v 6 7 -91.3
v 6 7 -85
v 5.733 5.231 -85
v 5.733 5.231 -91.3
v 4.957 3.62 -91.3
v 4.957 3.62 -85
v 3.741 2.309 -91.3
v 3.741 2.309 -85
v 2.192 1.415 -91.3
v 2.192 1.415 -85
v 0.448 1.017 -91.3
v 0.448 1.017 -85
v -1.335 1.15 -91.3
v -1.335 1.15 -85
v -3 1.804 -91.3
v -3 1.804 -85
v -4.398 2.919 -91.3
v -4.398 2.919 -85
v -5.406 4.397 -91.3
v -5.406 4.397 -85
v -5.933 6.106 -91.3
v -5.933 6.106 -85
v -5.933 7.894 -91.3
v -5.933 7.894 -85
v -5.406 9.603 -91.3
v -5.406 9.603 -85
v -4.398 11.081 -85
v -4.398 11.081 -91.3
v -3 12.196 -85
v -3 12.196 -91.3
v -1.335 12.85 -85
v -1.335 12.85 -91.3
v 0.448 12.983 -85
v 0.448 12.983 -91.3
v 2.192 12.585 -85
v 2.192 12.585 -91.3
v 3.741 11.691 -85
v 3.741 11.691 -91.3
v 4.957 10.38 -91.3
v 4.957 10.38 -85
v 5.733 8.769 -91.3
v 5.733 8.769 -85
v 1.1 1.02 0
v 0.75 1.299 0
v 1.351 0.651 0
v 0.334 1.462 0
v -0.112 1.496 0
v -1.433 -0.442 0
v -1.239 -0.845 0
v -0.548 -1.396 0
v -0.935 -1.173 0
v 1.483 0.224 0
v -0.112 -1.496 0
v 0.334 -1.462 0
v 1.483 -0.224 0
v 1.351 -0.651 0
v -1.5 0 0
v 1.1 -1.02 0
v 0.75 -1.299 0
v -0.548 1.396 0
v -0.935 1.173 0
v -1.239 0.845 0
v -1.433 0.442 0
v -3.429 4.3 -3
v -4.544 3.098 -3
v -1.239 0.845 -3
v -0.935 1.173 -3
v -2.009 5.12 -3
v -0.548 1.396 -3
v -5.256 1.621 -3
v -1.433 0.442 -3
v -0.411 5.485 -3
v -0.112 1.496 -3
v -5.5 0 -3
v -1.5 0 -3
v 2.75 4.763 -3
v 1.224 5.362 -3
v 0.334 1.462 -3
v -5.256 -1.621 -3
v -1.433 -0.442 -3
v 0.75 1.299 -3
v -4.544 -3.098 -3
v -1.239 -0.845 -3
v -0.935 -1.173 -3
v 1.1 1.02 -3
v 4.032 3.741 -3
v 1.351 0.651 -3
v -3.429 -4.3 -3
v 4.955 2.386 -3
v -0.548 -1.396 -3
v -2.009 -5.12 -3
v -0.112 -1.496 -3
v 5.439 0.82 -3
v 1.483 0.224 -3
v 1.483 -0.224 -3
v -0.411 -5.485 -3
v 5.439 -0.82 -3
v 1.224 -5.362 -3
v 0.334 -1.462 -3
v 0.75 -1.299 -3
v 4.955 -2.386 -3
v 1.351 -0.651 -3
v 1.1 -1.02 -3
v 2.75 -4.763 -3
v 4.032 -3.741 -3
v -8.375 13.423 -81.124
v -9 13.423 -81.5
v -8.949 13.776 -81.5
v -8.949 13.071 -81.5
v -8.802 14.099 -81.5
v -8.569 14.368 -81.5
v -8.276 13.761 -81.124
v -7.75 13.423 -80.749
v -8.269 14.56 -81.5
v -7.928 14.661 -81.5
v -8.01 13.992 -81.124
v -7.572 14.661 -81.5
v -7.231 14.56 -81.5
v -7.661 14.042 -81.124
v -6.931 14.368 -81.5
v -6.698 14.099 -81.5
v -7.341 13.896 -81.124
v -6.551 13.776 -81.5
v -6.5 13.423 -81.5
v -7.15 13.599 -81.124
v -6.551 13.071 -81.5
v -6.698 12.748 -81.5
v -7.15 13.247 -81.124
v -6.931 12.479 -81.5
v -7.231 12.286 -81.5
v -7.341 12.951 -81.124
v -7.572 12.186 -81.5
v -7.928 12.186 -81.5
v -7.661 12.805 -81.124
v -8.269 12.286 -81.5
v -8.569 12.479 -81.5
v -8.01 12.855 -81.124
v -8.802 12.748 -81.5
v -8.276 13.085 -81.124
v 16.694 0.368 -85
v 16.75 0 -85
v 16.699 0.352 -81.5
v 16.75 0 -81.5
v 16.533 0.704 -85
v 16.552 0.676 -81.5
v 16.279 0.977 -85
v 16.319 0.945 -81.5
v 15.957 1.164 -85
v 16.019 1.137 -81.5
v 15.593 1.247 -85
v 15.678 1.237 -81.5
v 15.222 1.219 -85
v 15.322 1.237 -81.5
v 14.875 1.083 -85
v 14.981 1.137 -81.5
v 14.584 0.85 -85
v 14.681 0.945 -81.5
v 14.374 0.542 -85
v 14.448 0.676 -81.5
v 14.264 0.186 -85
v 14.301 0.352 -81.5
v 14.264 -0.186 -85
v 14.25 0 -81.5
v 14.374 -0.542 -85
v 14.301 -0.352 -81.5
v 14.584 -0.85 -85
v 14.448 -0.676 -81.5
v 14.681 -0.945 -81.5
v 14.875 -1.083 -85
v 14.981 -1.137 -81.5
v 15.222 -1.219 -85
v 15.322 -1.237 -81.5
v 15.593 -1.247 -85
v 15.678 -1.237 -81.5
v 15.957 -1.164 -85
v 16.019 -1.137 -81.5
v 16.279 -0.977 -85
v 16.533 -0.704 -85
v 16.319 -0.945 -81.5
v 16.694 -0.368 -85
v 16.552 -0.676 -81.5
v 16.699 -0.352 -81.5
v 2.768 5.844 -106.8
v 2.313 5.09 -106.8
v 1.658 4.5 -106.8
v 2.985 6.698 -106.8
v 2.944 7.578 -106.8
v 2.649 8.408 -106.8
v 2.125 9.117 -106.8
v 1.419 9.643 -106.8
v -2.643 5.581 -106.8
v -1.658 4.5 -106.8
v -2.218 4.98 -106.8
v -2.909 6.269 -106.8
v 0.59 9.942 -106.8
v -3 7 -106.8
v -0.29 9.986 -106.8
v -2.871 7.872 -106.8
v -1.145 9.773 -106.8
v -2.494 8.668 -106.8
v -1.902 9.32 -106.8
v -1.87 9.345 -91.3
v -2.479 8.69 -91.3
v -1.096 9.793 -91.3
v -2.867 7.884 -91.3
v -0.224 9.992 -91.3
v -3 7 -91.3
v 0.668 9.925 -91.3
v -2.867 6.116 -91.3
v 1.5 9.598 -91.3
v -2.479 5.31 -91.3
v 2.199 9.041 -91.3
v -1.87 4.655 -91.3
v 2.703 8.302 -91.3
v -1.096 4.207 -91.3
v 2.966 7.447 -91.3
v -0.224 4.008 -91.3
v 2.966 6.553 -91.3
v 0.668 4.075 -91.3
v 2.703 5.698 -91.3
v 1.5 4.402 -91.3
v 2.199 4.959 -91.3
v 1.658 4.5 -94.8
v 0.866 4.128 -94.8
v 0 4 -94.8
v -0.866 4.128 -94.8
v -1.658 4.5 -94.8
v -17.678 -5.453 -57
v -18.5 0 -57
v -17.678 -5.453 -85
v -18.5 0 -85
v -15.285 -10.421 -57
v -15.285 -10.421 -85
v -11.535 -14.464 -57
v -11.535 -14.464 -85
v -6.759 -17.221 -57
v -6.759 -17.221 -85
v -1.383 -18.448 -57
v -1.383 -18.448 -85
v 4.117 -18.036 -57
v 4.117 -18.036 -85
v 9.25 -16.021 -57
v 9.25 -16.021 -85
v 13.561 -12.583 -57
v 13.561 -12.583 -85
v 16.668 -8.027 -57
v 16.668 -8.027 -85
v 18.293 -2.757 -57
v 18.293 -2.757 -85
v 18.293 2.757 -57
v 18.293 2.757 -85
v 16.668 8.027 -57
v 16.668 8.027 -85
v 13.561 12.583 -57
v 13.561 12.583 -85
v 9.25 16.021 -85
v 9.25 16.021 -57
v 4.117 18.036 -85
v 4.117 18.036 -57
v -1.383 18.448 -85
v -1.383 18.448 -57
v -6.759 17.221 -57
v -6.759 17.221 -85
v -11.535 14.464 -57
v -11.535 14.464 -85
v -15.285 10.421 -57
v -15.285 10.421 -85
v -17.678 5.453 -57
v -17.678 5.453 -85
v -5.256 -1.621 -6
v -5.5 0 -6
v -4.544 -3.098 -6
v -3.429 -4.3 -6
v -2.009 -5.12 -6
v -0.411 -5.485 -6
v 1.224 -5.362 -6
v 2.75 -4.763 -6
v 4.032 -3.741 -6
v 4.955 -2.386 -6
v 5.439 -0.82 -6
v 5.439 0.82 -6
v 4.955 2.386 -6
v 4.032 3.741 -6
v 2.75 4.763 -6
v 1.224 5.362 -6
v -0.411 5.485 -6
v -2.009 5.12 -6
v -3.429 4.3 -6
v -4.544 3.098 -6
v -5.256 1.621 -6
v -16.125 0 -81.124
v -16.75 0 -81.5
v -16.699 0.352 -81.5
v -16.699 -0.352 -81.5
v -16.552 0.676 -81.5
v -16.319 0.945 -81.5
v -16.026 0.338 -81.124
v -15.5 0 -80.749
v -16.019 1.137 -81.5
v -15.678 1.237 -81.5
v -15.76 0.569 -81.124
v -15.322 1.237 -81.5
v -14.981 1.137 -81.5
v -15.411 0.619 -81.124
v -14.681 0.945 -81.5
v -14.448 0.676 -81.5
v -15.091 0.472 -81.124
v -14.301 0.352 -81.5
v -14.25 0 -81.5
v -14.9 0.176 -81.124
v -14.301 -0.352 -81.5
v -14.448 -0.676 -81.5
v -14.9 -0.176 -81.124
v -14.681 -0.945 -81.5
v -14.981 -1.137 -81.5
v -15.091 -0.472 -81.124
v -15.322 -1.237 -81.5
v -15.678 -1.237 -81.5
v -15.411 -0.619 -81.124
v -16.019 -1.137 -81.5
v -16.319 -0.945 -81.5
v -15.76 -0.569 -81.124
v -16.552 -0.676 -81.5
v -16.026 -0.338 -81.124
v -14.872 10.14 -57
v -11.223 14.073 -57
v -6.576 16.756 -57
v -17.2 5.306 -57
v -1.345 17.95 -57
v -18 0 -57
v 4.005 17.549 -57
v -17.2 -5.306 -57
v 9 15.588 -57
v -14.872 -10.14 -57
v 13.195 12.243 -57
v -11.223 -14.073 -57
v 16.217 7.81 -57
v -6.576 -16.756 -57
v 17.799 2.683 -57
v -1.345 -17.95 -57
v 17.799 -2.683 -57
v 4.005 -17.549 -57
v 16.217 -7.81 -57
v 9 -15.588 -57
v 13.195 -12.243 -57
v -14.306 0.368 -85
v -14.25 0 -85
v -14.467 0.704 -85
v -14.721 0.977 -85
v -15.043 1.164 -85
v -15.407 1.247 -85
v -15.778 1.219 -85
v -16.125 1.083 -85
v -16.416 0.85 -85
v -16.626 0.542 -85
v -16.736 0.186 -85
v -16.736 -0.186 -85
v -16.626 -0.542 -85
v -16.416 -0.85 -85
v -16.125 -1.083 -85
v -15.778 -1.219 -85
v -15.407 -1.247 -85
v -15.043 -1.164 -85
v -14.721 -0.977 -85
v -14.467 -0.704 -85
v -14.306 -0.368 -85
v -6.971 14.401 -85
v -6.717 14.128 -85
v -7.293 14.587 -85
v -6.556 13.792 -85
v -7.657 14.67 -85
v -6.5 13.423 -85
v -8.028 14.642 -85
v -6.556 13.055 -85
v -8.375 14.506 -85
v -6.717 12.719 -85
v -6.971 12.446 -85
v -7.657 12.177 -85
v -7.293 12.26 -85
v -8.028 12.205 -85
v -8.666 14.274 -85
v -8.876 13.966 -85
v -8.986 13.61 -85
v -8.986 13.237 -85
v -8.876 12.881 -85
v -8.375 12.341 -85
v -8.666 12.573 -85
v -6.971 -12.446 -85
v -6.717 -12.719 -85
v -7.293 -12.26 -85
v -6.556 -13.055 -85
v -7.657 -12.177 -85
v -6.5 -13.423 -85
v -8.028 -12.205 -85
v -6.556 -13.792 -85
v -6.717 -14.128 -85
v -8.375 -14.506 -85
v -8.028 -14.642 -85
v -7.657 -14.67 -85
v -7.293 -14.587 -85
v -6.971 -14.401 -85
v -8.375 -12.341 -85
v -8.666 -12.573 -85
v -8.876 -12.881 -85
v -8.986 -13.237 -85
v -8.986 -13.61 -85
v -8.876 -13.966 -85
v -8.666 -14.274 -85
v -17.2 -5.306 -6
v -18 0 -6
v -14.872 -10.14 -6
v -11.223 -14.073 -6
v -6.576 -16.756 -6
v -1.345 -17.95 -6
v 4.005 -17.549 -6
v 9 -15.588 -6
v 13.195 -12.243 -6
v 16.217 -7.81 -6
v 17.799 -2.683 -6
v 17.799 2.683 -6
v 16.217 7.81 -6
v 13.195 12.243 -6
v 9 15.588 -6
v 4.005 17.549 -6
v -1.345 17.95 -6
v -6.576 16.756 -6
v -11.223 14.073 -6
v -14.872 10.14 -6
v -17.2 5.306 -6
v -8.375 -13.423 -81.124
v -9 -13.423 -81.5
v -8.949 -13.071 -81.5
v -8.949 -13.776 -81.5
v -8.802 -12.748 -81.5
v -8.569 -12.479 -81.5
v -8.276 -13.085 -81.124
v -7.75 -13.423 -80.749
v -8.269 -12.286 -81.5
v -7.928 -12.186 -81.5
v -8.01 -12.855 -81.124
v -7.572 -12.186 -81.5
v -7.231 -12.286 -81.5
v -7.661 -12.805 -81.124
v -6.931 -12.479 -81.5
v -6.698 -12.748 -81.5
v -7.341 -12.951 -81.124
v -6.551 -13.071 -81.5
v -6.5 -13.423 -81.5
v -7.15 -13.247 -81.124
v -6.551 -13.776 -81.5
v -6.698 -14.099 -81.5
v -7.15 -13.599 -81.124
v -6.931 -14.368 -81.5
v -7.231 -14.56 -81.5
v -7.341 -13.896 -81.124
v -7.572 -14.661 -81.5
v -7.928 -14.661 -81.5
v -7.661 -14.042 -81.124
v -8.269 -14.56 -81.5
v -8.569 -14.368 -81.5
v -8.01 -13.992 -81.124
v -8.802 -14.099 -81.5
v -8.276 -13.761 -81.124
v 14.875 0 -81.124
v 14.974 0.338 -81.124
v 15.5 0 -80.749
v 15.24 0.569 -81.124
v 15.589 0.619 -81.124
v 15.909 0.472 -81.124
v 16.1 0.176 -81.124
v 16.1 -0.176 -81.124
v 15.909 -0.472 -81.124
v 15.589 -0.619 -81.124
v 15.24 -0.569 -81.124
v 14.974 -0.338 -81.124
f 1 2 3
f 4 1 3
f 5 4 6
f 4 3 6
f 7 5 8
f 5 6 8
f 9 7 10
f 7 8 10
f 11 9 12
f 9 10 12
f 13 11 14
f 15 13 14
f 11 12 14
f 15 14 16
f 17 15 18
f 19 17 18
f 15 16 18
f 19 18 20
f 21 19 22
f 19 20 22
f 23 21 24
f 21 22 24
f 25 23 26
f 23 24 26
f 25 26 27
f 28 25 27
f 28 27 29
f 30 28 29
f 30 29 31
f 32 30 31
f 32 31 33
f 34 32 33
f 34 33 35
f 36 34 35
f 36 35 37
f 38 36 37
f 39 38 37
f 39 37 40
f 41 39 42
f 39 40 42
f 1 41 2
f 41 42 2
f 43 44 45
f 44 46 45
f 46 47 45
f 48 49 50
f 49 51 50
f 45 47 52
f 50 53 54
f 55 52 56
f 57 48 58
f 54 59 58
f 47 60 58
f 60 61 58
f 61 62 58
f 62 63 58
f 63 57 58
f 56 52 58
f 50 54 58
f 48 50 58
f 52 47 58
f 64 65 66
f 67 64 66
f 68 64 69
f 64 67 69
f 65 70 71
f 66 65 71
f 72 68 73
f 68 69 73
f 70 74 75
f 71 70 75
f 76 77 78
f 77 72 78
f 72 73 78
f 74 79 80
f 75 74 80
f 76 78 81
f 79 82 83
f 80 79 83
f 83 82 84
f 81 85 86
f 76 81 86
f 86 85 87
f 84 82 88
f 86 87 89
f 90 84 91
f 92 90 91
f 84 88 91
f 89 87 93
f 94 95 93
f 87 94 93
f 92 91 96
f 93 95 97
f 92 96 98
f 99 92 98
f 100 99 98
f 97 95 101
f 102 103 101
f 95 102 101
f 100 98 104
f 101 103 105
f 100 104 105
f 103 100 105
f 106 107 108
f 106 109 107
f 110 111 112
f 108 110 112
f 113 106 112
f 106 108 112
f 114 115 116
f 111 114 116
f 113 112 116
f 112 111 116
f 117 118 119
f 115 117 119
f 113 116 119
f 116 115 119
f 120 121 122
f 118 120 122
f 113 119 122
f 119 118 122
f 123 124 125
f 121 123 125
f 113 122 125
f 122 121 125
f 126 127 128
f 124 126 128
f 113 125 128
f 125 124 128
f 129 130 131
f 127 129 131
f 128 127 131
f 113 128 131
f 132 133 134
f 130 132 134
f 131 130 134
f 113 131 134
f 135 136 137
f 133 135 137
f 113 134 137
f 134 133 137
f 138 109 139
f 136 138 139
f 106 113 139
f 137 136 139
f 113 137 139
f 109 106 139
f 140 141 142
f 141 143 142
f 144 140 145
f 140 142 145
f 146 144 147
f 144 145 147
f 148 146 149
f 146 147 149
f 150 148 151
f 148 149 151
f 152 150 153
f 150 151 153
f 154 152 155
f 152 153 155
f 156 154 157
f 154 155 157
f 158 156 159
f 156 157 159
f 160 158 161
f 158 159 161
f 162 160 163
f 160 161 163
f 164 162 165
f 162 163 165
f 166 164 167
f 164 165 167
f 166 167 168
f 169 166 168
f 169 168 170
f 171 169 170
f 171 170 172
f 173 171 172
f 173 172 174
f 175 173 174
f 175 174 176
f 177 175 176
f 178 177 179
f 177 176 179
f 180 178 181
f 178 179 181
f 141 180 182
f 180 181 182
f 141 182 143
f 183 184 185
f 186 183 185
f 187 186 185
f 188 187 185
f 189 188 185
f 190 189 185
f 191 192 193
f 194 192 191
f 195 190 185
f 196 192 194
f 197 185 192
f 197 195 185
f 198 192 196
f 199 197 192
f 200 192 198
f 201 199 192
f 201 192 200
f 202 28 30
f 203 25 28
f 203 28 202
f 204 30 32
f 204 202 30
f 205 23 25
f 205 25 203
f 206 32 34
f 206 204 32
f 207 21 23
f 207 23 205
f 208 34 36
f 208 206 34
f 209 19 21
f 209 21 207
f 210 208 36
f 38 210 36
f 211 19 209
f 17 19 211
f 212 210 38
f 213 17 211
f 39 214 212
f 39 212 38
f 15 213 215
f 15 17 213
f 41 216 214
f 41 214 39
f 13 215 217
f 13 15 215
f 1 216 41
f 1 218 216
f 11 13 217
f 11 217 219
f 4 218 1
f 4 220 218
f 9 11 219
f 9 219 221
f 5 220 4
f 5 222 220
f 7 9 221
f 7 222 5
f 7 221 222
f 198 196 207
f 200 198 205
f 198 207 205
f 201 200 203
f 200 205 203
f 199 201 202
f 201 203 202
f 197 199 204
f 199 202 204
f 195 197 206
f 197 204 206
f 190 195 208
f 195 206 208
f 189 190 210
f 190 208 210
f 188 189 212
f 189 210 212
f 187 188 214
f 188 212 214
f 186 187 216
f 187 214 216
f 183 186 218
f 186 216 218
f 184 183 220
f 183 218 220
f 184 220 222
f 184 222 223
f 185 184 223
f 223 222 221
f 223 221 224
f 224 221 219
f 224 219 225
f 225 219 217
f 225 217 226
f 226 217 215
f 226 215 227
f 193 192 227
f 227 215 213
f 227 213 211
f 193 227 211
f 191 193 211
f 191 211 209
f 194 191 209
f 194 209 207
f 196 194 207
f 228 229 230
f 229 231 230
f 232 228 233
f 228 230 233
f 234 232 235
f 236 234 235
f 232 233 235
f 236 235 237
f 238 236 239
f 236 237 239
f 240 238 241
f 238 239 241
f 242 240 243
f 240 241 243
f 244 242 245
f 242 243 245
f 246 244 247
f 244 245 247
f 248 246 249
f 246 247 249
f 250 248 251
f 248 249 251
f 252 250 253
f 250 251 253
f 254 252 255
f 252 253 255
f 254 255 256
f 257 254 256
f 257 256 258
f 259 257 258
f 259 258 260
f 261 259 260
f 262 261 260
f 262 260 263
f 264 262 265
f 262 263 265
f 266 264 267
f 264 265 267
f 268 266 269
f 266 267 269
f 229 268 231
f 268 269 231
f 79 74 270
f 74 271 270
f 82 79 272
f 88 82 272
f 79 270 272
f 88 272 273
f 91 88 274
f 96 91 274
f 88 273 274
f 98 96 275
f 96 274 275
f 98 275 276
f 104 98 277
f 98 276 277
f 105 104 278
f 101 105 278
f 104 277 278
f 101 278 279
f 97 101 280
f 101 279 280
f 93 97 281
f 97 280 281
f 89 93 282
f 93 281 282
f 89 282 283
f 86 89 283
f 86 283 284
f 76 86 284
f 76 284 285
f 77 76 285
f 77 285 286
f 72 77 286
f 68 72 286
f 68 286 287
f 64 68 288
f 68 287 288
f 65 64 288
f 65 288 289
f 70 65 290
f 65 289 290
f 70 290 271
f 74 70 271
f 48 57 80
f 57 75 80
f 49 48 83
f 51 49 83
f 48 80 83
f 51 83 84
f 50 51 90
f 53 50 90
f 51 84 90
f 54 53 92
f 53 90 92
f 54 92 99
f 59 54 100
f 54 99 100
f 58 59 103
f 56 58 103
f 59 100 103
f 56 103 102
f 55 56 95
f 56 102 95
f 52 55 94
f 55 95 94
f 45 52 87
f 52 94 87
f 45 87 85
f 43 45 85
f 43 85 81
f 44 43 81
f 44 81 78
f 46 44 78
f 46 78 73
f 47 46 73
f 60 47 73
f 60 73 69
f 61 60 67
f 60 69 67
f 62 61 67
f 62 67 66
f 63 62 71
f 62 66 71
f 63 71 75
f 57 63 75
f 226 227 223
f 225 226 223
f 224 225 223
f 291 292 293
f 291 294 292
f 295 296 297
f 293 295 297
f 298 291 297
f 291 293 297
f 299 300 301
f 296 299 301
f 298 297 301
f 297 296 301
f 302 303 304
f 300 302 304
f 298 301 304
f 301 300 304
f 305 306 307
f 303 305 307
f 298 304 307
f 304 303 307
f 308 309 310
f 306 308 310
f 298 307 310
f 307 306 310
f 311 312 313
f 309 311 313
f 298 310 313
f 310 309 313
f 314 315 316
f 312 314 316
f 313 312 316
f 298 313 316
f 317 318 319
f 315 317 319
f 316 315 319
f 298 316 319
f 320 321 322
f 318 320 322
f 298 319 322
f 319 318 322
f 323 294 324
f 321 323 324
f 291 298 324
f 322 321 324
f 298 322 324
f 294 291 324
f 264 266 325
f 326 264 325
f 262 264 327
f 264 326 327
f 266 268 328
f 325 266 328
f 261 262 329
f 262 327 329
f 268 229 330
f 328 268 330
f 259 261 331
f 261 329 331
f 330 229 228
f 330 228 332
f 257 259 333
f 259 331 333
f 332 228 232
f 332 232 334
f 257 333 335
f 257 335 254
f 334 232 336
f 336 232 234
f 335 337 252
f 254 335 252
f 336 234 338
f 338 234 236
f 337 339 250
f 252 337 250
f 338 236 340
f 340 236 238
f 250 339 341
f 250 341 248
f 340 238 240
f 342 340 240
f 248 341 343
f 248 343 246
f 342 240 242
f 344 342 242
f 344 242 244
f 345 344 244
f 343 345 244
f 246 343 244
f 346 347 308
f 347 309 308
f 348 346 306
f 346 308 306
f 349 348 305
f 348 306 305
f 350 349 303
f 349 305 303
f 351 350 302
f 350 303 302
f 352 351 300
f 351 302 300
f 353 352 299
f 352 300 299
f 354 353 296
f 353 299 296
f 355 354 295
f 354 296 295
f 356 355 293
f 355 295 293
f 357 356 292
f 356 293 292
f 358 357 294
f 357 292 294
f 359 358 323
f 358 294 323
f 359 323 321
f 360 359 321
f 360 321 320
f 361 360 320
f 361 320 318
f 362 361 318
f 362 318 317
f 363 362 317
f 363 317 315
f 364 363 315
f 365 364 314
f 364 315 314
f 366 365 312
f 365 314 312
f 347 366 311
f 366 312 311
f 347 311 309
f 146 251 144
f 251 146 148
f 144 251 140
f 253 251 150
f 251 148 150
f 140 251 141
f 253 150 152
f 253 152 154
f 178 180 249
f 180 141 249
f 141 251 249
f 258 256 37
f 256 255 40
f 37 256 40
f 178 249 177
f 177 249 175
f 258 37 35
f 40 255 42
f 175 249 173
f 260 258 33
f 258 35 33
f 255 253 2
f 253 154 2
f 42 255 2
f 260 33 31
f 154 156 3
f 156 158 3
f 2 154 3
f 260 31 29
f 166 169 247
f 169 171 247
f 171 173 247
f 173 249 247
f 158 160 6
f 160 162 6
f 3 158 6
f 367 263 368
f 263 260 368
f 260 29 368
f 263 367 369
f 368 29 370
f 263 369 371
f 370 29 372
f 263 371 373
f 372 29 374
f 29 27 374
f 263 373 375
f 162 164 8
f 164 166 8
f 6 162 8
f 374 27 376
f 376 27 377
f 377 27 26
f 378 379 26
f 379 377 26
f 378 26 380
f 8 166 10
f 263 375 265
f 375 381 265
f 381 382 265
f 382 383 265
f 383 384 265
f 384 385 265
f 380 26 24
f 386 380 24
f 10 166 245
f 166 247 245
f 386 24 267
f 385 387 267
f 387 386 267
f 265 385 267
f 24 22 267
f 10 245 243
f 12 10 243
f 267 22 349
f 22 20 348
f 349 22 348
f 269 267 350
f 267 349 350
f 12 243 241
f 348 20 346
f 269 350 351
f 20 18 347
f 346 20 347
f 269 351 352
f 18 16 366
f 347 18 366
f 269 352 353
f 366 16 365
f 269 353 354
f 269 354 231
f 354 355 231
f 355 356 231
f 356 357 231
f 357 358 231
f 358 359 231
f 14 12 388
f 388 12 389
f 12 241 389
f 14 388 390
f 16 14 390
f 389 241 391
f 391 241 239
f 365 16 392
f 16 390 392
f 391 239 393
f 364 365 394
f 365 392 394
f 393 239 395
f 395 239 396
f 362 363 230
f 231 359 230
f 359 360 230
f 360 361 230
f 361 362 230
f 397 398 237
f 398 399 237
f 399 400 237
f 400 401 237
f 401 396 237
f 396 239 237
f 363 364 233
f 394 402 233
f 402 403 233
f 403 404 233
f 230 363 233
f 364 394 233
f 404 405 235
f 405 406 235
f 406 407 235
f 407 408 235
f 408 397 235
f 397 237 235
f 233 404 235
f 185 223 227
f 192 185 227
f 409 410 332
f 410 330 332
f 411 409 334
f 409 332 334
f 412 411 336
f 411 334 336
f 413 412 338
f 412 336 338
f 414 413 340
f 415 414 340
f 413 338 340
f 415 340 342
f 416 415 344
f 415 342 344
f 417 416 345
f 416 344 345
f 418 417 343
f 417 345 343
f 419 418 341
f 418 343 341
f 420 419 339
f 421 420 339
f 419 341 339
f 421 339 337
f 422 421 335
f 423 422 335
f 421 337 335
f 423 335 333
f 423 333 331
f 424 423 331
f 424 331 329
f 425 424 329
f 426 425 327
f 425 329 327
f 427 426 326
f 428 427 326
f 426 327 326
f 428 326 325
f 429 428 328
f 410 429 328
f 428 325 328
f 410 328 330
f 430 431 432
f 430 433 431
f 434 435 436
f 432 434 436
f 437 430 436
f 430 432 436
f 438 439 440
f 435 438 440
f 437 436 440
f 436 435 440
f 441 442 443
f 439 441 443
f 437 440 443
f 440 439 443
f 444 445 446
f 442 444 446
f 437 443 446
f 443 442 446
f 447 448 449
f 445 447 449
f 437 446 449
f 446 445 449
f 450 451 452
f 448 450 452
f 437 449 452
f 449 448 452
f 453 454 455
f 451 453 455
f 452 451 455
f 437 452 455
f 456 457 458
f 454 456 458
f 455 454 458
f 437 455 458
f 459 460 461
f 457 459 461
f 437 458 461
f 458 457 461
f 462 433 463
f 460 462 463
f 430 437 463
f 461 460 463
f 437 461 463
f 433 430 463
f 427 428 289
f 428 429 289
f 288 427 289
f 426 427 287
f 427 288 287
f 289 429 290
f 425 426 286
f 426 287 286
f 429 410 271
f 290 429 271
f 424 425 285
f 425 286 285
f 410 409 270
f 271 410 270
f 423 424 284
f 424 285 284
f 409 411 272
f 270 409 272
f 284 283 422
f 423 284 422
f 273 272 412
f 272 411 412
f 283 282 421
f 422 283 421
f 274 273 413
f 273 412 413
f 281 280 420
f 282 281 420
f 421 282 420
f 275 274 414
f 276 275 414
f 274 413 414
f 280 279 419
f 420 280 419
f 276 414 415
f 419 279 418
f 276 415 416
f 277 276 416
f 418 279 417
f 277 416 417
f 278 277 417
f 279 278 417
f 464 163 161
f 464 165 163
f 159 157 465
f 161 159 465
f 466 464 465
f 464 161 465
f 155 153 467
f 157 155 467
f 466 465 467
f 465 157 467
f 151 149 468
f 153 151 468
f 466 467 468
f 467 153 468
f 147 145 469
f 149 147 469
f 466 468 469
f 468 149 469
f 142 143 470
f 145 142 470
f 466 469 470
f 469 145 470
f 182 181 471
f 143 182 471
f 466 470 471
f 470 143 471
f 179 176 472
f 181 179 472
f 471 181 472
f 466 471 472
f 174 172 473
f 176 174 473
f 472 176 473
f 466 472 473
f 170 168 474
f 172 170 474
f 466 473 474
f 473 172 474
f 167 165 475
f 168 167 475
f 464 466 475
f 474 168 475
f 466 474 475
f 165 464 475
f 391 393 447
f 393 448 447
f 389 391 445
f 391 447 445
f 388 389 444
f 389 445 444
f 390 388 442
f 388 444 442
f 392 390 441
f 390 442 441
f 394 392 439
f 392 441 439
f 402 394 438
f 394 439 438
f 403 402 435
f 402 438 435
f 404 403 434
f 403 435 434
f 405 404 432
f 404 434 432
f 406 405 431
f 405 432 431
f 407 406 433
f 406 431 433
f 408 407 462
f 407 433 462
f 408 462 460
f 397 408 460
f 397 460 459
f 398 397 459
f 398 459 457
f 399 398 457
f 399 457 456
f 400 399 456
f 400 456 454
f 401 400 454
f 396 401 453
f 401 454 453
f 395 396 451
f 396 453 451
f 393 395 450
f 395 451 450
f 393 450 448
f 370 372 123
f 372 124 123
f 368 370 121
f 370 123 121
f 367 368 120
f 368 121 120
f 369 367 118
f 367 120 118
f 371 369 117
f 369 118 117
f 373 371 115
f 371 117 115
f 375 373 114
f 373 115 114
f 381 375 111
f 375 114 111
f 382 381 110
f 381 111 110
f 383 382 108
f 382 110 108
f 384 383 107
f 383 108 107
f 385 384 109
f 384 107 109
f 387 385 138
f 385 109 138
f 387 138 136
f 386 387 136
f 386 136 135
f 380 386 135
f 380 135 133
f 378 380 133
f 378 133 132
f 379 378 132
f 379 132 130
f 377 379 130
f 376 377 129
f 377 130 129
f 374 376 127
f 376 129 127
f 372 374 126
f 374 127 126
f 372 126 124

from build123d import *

# Parameters (mm, degrees)
SKETCH2_R                 = 6
BOSS_EXTRUDE1_DEPTH       = 6.3
SKETCH3_R                 = 3
BOSS_EXTRUDE2_DEPTH       = 15.5
M3X0_5_TAPPED_HOLE1_D     = 2.5
M3X0_5_TAPPED_HOLE1_DEPTH = 3.5
M3X0_5_TAPPED_HOLE1_TIP   = 0.751075774
CUT_EXTRUDE1_START        = -12
CUT_EXTRUDE1_DEPTH        = 12


with BuildPart() as part:
    # Sketch1 → Revolve1 (revolve)
    with BuildSketch(Plane(origin=(0, 0, 0), x_dir=(0, 0, -1), z_dir=(1, 0, 0)), mode=Mode.PRIVATE) as revolve1_sk:
        Polygon((0, 0), (0, -1.5), (3, -1.5), (3, -5.5), (6, -5.5), (6, -18), (57, -18), (57, -18.5), (85, -18.5), (85, 0), align=None)
    revolve(revolve1_sk.sketch.rotate(Axis((0, 0, -33.870967742), (0, 0, 1)), 270), axis=Axis((0, 0, -33.870967742), (0, 0, 1)))

    # Sketch2 → Boss-Extrude1 (add)
    with BuildSketch(Plane(origin=(0, 0, -85), x_dir=(-1, 0, 0), z_dir=(0, 0, -1))):
        with Locations(Location((0, 7, 0), (0, 0, 180))):
            Circle(SKETCH2_R)
    extrude(amount=BOSS_EXTRUDE1_DEPTH)

    # Sketch3 → Boss-Extrude2 (add)
    with BuildSketch(Plane(origin=(0, 0, -91.3), x_dir=(-1, 0, 0), z_dir=(0, 0, -1))):
        with Locations((0, 7)):
            Circle(SKETCH3_R)
    extrude(amount=BOSS_EXTRUDE2_DEPTH)

    # M3x0.5 Tapped Hole1
    with Locations(Plane(origin=(0, 0, -85), x_dir=(-1, 0, 0), z_dir=(0, 0, -1))):
        with Locations((7.75, -13.423393759), (15.5, 0), (-15.5, 0), (7.75, 13.423393759)):
            Hole(M3X0_5_TAPPED_HOLE1_D / 2, depth=M3X0_5_TAPPED_HOLE1_DEPTH)
            with Locations((0, 0, -(M3X0_5_TAPPED_HOLE1_DEPTH + M3X0_5_TAPPED_HOLE1_TIP / 2))):  # 118° drill point
                Cone(0, M3X0_5_TAPPED_HOLE1_D / 2, M3X0_5_TAPPED_HOLE1_TIP, mode=Mode.SUBTRACT)

    # Sketch6 → Cut-Extrude1 (cut)
    with BuildSketch(Plane(origin=(0, 0, -106.8), x_dir=(-1, 0, 0), z_dir=(0, 0, -1)).offset(CUT_EXTRUDE1_START)):
        with BuildLine():
            Line((-1.658312395, 4.5), (1.658312395, 4.5))
            ThreePointArc((1.658312395, 4.5), (0, 4), (-1.658312395, 4.5))
        make_face()
    extrude(amount=CUT_EXTRUDE1_DEPTH, mode=Mode.SUBTRACT)


solid = part.part
